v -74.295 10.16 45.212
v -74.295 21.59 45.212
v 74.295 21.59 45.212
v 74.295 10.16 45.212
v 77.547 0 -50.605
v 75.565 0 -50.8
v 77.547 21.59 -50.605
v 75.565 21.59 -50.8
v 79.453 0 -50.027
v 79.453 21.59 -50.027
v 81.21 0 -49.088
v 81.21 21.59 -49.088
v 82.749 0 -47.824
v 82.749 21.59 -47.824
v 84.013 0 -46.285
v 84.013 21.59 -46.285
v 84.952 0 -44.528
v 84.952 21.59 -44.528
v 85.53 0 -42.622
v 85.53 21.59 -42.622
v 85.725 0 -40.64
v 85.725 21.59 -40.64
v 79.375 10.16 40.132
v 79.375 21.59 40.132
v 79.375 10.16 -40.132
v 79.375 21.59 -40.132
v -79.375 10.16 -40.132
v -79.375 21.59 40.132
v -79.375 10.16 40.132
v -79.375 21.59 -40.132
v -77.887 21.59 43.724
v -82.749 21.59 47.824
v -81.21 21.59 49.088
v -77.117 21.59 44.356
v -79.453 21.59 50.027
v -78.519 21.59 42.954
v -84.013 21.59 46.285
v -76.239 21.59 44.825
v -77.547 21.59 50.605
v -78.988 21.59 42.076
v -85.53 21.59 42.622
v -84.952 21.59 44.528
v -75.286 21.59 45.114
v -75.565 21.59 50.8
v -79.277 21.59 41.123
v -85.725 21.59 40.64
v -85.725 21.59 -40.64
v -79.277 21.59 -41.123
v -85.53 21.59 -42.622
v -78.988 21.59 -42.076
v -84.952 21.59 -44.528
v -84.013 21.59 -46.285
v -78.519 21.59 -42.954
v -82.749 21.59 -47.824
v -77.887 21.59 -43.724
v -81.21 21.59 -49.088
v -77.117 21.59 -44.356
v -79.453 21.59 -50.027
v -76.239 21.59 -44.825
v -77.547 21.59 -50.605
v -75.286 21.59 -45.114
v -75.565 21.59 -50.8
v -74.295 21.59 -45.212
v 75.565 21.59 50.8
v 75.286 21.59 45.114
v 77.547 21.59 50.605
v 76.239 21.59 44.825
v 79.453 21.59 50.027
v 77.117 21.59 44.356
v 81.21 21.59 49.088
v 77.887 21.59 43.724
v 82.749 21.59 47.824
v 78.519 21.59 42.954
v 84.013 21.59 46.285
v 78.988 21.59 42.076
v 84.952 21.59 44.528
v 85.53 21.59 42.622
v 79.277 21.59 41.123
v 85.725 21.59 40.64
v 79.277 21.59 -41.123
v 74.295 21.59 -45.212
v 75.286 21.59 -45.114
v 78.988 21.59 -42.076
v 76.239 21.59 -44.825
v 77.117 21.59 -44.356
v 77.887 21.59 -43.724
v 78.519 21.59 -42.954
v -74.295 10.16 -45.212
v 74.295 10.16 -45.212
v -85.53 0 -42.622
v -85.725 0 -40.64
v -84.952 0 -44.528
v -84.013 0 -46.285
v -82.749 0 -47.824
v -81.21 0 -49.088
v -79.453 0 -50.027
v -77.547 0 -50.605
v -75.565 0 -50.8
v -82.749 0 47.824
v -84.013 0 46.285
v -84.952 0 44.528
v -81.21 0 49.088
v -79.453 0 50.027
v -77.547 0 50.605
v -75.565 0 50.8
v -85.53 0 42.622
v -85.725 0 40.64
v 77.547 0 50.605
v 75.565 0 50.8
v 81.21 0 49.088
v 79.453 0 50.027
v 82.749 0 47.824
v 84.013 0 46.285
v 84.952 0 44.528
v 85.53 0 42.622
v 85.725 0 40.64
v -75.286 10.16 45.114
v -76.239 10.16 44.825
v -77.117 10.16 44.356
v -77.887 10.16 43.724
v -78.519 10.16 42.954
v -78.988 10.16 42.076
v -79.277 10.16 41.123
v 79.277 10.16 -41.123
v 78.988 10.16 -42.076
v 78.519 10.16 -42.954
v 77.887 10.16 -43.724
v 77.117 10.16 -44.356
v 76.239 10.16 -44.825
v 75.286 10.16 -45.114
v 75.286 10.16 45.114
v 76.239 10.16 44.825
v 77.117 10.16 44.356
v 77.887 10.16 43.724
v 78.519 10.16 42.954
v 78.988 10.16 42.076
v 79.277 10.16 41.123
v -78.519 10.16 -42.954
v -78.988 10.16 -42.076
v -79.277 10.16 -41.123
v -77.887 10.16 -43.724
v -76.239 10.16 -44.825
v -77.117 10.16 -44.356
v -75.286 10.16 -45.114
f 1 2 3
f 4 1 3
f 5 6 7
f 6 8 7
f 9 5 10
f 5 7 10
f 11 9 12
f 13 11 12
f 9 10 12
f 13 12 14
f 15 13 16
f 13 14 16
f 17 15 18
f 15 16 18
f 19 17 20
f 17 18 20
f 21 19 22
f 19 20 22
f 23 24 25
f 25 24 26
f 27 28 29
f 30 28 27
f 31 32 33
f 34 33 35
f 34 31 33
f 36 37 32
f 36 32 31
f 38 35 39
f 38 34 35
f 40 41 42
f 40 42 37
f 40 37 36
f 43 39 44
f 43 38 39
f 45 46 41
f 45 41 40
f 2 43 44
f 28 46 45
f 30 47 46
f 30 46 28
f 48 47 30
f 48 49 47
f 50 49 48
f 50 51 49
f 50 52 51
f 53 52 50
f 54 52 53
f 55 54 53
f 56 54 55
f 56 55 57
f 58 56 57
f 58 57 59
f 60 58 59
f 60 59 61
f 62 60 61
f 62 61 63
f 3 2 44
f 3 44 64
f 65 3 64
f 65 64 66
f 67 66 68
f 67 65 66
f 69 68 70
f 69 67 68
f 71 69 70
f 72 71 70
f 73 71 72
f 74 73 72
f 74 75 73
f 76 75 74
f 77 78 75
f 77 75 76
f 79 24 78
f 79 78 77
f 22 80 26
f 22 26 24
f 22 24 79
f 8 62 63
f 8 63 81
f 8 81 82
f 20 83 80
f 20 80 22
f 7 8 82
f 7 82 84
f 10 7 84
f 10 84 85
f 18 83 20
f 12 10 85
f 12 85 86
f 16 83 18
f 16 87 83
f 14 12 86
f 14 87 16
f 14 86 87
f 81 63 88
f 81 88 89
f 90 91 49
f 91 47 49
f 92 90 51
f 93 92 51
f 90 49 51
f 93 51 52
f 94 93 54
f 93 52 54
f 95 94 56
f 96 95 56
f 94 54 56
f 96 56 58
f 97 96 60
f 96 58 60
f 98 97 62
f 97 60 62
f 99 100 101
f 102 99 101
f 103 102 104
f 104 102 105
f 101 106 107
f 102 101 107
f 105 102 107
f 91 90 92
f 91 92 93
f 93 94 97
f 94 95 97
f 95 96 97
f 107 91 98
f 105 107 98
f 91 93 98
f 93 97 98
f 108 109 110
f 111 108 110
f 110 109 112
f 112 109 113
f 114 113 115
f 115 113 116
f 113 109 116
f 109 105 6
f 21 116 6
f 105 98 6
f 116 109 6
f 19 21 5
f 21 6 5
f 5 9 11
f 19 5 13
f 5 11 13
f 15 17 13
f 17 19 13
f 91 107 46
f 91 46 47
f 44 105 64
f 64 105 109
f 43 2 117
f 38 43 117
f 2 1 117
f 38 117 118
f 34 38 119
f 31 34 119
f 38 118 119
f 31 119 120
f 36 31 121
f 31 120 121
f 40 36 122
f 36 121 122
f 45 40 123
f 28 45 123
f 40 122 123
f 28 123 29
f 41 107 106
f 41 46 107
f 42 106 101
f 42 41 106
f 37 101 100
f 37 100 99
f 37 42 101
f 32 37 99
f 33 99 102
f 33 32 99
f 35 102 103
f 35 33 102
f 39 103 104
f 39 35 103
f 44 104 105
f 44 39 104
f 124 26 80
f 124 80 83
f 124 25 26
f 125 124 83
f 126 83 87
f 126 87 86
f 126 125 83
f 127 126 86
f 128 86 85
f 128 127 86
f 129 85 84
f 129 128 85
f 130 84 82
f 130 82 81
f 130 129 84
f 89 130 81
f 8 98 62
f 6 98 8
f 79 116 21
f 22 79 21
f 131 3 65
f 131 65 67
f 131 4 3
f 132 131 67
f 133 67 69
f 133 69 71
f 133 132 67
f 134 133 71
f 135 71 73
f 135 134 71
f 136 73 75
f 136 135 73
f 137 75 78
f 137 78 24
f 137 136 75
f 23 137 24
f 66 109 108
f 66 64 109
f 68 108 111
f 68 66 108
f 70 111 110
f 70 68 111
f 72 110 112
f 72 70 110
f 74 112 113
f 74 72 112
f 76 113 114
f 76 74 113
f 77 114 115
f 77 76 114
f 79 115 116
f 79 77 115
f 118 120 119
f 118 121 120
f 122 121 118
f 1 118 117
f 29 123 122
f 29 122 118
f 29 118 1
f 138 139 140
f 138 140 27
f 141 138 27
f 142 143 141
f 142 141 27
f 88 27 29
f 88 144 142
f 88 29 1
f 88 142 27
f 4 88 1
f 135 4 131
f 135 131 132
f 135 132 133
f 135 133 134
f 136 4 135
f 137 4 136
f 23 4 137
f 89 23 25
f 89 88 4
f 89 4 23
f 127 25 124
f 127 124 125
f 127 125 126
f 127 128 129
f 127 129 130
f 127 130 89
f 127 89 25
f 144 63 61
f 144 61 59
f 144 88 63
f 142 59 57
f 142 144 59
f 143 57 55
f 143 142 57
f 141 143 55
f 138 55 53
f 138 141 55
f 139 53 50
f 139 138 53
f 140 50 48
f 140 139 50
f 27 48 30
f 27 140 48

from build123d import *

# Parameters (mm, degrees)
SKETCH1_W           = 171.45
SKETCH1_H           = 101.6
BOSS_EXTRUDE1_DEPTH = 21.59
SKETCH2_W           = 158.75
SKETCH2_H           = 90.424
CUT_EXTRUDE1_DEPTH  = 11.43
FILLET1_R           = 5.08
FILLET2_R           = 10.16


with BuildPart() as part:
    # Sketch1 → Boss-Extrude1 (new body)
    with BuildSketch(Plane(origin=(0, 0, 0), x_dir=(1, 0, 0), z_dir=(0, 1, 0))):
        Rectangle(SKETCH1_W, SKETCH1_H)
    extrude(amount=BOSS_EXTRUDE1_DEPTH)

    # Sketch2 → Cut-Extrude1 (cut)
    with BuildSketch(Plane(origin=(0, 21.59, 0), x_dir=(1, 0, 0), z_dir=(0, 1, 0))):
        Rectangle(SKETCH2_W, SKETCH2_H)
    extrude(amount=-CUT_EXTRUDE1_DEPTH, mode=Mode.SUBTRACT)

    # Fillet1
    fillet1_edges = [part.edges().sort_by_distance(p)[0] for p in [
        (-79.375, 15.875, 45.212),
        (-79.375, 15.875, -45.212),
        (79.375, 15.875, -45.212),
        (79.375, 15.875, 45.212),
    ]]
    fillet(fillet1_edges, radius=FILLET1_R)

    # Fillet2
    fillet2_edges = [part.edges().sort_by_distance(p)[0] for p in [
        (-85.725, 10.795, -50.8),
        (85.725, 10.795, -50.8),
        (85.725, 10.795, 50.8),
        (-85.725, 10.795, 50.8),
    ]]
    fillet(fillet2_edges, radius=FILLET2_R)


solid = part.part
